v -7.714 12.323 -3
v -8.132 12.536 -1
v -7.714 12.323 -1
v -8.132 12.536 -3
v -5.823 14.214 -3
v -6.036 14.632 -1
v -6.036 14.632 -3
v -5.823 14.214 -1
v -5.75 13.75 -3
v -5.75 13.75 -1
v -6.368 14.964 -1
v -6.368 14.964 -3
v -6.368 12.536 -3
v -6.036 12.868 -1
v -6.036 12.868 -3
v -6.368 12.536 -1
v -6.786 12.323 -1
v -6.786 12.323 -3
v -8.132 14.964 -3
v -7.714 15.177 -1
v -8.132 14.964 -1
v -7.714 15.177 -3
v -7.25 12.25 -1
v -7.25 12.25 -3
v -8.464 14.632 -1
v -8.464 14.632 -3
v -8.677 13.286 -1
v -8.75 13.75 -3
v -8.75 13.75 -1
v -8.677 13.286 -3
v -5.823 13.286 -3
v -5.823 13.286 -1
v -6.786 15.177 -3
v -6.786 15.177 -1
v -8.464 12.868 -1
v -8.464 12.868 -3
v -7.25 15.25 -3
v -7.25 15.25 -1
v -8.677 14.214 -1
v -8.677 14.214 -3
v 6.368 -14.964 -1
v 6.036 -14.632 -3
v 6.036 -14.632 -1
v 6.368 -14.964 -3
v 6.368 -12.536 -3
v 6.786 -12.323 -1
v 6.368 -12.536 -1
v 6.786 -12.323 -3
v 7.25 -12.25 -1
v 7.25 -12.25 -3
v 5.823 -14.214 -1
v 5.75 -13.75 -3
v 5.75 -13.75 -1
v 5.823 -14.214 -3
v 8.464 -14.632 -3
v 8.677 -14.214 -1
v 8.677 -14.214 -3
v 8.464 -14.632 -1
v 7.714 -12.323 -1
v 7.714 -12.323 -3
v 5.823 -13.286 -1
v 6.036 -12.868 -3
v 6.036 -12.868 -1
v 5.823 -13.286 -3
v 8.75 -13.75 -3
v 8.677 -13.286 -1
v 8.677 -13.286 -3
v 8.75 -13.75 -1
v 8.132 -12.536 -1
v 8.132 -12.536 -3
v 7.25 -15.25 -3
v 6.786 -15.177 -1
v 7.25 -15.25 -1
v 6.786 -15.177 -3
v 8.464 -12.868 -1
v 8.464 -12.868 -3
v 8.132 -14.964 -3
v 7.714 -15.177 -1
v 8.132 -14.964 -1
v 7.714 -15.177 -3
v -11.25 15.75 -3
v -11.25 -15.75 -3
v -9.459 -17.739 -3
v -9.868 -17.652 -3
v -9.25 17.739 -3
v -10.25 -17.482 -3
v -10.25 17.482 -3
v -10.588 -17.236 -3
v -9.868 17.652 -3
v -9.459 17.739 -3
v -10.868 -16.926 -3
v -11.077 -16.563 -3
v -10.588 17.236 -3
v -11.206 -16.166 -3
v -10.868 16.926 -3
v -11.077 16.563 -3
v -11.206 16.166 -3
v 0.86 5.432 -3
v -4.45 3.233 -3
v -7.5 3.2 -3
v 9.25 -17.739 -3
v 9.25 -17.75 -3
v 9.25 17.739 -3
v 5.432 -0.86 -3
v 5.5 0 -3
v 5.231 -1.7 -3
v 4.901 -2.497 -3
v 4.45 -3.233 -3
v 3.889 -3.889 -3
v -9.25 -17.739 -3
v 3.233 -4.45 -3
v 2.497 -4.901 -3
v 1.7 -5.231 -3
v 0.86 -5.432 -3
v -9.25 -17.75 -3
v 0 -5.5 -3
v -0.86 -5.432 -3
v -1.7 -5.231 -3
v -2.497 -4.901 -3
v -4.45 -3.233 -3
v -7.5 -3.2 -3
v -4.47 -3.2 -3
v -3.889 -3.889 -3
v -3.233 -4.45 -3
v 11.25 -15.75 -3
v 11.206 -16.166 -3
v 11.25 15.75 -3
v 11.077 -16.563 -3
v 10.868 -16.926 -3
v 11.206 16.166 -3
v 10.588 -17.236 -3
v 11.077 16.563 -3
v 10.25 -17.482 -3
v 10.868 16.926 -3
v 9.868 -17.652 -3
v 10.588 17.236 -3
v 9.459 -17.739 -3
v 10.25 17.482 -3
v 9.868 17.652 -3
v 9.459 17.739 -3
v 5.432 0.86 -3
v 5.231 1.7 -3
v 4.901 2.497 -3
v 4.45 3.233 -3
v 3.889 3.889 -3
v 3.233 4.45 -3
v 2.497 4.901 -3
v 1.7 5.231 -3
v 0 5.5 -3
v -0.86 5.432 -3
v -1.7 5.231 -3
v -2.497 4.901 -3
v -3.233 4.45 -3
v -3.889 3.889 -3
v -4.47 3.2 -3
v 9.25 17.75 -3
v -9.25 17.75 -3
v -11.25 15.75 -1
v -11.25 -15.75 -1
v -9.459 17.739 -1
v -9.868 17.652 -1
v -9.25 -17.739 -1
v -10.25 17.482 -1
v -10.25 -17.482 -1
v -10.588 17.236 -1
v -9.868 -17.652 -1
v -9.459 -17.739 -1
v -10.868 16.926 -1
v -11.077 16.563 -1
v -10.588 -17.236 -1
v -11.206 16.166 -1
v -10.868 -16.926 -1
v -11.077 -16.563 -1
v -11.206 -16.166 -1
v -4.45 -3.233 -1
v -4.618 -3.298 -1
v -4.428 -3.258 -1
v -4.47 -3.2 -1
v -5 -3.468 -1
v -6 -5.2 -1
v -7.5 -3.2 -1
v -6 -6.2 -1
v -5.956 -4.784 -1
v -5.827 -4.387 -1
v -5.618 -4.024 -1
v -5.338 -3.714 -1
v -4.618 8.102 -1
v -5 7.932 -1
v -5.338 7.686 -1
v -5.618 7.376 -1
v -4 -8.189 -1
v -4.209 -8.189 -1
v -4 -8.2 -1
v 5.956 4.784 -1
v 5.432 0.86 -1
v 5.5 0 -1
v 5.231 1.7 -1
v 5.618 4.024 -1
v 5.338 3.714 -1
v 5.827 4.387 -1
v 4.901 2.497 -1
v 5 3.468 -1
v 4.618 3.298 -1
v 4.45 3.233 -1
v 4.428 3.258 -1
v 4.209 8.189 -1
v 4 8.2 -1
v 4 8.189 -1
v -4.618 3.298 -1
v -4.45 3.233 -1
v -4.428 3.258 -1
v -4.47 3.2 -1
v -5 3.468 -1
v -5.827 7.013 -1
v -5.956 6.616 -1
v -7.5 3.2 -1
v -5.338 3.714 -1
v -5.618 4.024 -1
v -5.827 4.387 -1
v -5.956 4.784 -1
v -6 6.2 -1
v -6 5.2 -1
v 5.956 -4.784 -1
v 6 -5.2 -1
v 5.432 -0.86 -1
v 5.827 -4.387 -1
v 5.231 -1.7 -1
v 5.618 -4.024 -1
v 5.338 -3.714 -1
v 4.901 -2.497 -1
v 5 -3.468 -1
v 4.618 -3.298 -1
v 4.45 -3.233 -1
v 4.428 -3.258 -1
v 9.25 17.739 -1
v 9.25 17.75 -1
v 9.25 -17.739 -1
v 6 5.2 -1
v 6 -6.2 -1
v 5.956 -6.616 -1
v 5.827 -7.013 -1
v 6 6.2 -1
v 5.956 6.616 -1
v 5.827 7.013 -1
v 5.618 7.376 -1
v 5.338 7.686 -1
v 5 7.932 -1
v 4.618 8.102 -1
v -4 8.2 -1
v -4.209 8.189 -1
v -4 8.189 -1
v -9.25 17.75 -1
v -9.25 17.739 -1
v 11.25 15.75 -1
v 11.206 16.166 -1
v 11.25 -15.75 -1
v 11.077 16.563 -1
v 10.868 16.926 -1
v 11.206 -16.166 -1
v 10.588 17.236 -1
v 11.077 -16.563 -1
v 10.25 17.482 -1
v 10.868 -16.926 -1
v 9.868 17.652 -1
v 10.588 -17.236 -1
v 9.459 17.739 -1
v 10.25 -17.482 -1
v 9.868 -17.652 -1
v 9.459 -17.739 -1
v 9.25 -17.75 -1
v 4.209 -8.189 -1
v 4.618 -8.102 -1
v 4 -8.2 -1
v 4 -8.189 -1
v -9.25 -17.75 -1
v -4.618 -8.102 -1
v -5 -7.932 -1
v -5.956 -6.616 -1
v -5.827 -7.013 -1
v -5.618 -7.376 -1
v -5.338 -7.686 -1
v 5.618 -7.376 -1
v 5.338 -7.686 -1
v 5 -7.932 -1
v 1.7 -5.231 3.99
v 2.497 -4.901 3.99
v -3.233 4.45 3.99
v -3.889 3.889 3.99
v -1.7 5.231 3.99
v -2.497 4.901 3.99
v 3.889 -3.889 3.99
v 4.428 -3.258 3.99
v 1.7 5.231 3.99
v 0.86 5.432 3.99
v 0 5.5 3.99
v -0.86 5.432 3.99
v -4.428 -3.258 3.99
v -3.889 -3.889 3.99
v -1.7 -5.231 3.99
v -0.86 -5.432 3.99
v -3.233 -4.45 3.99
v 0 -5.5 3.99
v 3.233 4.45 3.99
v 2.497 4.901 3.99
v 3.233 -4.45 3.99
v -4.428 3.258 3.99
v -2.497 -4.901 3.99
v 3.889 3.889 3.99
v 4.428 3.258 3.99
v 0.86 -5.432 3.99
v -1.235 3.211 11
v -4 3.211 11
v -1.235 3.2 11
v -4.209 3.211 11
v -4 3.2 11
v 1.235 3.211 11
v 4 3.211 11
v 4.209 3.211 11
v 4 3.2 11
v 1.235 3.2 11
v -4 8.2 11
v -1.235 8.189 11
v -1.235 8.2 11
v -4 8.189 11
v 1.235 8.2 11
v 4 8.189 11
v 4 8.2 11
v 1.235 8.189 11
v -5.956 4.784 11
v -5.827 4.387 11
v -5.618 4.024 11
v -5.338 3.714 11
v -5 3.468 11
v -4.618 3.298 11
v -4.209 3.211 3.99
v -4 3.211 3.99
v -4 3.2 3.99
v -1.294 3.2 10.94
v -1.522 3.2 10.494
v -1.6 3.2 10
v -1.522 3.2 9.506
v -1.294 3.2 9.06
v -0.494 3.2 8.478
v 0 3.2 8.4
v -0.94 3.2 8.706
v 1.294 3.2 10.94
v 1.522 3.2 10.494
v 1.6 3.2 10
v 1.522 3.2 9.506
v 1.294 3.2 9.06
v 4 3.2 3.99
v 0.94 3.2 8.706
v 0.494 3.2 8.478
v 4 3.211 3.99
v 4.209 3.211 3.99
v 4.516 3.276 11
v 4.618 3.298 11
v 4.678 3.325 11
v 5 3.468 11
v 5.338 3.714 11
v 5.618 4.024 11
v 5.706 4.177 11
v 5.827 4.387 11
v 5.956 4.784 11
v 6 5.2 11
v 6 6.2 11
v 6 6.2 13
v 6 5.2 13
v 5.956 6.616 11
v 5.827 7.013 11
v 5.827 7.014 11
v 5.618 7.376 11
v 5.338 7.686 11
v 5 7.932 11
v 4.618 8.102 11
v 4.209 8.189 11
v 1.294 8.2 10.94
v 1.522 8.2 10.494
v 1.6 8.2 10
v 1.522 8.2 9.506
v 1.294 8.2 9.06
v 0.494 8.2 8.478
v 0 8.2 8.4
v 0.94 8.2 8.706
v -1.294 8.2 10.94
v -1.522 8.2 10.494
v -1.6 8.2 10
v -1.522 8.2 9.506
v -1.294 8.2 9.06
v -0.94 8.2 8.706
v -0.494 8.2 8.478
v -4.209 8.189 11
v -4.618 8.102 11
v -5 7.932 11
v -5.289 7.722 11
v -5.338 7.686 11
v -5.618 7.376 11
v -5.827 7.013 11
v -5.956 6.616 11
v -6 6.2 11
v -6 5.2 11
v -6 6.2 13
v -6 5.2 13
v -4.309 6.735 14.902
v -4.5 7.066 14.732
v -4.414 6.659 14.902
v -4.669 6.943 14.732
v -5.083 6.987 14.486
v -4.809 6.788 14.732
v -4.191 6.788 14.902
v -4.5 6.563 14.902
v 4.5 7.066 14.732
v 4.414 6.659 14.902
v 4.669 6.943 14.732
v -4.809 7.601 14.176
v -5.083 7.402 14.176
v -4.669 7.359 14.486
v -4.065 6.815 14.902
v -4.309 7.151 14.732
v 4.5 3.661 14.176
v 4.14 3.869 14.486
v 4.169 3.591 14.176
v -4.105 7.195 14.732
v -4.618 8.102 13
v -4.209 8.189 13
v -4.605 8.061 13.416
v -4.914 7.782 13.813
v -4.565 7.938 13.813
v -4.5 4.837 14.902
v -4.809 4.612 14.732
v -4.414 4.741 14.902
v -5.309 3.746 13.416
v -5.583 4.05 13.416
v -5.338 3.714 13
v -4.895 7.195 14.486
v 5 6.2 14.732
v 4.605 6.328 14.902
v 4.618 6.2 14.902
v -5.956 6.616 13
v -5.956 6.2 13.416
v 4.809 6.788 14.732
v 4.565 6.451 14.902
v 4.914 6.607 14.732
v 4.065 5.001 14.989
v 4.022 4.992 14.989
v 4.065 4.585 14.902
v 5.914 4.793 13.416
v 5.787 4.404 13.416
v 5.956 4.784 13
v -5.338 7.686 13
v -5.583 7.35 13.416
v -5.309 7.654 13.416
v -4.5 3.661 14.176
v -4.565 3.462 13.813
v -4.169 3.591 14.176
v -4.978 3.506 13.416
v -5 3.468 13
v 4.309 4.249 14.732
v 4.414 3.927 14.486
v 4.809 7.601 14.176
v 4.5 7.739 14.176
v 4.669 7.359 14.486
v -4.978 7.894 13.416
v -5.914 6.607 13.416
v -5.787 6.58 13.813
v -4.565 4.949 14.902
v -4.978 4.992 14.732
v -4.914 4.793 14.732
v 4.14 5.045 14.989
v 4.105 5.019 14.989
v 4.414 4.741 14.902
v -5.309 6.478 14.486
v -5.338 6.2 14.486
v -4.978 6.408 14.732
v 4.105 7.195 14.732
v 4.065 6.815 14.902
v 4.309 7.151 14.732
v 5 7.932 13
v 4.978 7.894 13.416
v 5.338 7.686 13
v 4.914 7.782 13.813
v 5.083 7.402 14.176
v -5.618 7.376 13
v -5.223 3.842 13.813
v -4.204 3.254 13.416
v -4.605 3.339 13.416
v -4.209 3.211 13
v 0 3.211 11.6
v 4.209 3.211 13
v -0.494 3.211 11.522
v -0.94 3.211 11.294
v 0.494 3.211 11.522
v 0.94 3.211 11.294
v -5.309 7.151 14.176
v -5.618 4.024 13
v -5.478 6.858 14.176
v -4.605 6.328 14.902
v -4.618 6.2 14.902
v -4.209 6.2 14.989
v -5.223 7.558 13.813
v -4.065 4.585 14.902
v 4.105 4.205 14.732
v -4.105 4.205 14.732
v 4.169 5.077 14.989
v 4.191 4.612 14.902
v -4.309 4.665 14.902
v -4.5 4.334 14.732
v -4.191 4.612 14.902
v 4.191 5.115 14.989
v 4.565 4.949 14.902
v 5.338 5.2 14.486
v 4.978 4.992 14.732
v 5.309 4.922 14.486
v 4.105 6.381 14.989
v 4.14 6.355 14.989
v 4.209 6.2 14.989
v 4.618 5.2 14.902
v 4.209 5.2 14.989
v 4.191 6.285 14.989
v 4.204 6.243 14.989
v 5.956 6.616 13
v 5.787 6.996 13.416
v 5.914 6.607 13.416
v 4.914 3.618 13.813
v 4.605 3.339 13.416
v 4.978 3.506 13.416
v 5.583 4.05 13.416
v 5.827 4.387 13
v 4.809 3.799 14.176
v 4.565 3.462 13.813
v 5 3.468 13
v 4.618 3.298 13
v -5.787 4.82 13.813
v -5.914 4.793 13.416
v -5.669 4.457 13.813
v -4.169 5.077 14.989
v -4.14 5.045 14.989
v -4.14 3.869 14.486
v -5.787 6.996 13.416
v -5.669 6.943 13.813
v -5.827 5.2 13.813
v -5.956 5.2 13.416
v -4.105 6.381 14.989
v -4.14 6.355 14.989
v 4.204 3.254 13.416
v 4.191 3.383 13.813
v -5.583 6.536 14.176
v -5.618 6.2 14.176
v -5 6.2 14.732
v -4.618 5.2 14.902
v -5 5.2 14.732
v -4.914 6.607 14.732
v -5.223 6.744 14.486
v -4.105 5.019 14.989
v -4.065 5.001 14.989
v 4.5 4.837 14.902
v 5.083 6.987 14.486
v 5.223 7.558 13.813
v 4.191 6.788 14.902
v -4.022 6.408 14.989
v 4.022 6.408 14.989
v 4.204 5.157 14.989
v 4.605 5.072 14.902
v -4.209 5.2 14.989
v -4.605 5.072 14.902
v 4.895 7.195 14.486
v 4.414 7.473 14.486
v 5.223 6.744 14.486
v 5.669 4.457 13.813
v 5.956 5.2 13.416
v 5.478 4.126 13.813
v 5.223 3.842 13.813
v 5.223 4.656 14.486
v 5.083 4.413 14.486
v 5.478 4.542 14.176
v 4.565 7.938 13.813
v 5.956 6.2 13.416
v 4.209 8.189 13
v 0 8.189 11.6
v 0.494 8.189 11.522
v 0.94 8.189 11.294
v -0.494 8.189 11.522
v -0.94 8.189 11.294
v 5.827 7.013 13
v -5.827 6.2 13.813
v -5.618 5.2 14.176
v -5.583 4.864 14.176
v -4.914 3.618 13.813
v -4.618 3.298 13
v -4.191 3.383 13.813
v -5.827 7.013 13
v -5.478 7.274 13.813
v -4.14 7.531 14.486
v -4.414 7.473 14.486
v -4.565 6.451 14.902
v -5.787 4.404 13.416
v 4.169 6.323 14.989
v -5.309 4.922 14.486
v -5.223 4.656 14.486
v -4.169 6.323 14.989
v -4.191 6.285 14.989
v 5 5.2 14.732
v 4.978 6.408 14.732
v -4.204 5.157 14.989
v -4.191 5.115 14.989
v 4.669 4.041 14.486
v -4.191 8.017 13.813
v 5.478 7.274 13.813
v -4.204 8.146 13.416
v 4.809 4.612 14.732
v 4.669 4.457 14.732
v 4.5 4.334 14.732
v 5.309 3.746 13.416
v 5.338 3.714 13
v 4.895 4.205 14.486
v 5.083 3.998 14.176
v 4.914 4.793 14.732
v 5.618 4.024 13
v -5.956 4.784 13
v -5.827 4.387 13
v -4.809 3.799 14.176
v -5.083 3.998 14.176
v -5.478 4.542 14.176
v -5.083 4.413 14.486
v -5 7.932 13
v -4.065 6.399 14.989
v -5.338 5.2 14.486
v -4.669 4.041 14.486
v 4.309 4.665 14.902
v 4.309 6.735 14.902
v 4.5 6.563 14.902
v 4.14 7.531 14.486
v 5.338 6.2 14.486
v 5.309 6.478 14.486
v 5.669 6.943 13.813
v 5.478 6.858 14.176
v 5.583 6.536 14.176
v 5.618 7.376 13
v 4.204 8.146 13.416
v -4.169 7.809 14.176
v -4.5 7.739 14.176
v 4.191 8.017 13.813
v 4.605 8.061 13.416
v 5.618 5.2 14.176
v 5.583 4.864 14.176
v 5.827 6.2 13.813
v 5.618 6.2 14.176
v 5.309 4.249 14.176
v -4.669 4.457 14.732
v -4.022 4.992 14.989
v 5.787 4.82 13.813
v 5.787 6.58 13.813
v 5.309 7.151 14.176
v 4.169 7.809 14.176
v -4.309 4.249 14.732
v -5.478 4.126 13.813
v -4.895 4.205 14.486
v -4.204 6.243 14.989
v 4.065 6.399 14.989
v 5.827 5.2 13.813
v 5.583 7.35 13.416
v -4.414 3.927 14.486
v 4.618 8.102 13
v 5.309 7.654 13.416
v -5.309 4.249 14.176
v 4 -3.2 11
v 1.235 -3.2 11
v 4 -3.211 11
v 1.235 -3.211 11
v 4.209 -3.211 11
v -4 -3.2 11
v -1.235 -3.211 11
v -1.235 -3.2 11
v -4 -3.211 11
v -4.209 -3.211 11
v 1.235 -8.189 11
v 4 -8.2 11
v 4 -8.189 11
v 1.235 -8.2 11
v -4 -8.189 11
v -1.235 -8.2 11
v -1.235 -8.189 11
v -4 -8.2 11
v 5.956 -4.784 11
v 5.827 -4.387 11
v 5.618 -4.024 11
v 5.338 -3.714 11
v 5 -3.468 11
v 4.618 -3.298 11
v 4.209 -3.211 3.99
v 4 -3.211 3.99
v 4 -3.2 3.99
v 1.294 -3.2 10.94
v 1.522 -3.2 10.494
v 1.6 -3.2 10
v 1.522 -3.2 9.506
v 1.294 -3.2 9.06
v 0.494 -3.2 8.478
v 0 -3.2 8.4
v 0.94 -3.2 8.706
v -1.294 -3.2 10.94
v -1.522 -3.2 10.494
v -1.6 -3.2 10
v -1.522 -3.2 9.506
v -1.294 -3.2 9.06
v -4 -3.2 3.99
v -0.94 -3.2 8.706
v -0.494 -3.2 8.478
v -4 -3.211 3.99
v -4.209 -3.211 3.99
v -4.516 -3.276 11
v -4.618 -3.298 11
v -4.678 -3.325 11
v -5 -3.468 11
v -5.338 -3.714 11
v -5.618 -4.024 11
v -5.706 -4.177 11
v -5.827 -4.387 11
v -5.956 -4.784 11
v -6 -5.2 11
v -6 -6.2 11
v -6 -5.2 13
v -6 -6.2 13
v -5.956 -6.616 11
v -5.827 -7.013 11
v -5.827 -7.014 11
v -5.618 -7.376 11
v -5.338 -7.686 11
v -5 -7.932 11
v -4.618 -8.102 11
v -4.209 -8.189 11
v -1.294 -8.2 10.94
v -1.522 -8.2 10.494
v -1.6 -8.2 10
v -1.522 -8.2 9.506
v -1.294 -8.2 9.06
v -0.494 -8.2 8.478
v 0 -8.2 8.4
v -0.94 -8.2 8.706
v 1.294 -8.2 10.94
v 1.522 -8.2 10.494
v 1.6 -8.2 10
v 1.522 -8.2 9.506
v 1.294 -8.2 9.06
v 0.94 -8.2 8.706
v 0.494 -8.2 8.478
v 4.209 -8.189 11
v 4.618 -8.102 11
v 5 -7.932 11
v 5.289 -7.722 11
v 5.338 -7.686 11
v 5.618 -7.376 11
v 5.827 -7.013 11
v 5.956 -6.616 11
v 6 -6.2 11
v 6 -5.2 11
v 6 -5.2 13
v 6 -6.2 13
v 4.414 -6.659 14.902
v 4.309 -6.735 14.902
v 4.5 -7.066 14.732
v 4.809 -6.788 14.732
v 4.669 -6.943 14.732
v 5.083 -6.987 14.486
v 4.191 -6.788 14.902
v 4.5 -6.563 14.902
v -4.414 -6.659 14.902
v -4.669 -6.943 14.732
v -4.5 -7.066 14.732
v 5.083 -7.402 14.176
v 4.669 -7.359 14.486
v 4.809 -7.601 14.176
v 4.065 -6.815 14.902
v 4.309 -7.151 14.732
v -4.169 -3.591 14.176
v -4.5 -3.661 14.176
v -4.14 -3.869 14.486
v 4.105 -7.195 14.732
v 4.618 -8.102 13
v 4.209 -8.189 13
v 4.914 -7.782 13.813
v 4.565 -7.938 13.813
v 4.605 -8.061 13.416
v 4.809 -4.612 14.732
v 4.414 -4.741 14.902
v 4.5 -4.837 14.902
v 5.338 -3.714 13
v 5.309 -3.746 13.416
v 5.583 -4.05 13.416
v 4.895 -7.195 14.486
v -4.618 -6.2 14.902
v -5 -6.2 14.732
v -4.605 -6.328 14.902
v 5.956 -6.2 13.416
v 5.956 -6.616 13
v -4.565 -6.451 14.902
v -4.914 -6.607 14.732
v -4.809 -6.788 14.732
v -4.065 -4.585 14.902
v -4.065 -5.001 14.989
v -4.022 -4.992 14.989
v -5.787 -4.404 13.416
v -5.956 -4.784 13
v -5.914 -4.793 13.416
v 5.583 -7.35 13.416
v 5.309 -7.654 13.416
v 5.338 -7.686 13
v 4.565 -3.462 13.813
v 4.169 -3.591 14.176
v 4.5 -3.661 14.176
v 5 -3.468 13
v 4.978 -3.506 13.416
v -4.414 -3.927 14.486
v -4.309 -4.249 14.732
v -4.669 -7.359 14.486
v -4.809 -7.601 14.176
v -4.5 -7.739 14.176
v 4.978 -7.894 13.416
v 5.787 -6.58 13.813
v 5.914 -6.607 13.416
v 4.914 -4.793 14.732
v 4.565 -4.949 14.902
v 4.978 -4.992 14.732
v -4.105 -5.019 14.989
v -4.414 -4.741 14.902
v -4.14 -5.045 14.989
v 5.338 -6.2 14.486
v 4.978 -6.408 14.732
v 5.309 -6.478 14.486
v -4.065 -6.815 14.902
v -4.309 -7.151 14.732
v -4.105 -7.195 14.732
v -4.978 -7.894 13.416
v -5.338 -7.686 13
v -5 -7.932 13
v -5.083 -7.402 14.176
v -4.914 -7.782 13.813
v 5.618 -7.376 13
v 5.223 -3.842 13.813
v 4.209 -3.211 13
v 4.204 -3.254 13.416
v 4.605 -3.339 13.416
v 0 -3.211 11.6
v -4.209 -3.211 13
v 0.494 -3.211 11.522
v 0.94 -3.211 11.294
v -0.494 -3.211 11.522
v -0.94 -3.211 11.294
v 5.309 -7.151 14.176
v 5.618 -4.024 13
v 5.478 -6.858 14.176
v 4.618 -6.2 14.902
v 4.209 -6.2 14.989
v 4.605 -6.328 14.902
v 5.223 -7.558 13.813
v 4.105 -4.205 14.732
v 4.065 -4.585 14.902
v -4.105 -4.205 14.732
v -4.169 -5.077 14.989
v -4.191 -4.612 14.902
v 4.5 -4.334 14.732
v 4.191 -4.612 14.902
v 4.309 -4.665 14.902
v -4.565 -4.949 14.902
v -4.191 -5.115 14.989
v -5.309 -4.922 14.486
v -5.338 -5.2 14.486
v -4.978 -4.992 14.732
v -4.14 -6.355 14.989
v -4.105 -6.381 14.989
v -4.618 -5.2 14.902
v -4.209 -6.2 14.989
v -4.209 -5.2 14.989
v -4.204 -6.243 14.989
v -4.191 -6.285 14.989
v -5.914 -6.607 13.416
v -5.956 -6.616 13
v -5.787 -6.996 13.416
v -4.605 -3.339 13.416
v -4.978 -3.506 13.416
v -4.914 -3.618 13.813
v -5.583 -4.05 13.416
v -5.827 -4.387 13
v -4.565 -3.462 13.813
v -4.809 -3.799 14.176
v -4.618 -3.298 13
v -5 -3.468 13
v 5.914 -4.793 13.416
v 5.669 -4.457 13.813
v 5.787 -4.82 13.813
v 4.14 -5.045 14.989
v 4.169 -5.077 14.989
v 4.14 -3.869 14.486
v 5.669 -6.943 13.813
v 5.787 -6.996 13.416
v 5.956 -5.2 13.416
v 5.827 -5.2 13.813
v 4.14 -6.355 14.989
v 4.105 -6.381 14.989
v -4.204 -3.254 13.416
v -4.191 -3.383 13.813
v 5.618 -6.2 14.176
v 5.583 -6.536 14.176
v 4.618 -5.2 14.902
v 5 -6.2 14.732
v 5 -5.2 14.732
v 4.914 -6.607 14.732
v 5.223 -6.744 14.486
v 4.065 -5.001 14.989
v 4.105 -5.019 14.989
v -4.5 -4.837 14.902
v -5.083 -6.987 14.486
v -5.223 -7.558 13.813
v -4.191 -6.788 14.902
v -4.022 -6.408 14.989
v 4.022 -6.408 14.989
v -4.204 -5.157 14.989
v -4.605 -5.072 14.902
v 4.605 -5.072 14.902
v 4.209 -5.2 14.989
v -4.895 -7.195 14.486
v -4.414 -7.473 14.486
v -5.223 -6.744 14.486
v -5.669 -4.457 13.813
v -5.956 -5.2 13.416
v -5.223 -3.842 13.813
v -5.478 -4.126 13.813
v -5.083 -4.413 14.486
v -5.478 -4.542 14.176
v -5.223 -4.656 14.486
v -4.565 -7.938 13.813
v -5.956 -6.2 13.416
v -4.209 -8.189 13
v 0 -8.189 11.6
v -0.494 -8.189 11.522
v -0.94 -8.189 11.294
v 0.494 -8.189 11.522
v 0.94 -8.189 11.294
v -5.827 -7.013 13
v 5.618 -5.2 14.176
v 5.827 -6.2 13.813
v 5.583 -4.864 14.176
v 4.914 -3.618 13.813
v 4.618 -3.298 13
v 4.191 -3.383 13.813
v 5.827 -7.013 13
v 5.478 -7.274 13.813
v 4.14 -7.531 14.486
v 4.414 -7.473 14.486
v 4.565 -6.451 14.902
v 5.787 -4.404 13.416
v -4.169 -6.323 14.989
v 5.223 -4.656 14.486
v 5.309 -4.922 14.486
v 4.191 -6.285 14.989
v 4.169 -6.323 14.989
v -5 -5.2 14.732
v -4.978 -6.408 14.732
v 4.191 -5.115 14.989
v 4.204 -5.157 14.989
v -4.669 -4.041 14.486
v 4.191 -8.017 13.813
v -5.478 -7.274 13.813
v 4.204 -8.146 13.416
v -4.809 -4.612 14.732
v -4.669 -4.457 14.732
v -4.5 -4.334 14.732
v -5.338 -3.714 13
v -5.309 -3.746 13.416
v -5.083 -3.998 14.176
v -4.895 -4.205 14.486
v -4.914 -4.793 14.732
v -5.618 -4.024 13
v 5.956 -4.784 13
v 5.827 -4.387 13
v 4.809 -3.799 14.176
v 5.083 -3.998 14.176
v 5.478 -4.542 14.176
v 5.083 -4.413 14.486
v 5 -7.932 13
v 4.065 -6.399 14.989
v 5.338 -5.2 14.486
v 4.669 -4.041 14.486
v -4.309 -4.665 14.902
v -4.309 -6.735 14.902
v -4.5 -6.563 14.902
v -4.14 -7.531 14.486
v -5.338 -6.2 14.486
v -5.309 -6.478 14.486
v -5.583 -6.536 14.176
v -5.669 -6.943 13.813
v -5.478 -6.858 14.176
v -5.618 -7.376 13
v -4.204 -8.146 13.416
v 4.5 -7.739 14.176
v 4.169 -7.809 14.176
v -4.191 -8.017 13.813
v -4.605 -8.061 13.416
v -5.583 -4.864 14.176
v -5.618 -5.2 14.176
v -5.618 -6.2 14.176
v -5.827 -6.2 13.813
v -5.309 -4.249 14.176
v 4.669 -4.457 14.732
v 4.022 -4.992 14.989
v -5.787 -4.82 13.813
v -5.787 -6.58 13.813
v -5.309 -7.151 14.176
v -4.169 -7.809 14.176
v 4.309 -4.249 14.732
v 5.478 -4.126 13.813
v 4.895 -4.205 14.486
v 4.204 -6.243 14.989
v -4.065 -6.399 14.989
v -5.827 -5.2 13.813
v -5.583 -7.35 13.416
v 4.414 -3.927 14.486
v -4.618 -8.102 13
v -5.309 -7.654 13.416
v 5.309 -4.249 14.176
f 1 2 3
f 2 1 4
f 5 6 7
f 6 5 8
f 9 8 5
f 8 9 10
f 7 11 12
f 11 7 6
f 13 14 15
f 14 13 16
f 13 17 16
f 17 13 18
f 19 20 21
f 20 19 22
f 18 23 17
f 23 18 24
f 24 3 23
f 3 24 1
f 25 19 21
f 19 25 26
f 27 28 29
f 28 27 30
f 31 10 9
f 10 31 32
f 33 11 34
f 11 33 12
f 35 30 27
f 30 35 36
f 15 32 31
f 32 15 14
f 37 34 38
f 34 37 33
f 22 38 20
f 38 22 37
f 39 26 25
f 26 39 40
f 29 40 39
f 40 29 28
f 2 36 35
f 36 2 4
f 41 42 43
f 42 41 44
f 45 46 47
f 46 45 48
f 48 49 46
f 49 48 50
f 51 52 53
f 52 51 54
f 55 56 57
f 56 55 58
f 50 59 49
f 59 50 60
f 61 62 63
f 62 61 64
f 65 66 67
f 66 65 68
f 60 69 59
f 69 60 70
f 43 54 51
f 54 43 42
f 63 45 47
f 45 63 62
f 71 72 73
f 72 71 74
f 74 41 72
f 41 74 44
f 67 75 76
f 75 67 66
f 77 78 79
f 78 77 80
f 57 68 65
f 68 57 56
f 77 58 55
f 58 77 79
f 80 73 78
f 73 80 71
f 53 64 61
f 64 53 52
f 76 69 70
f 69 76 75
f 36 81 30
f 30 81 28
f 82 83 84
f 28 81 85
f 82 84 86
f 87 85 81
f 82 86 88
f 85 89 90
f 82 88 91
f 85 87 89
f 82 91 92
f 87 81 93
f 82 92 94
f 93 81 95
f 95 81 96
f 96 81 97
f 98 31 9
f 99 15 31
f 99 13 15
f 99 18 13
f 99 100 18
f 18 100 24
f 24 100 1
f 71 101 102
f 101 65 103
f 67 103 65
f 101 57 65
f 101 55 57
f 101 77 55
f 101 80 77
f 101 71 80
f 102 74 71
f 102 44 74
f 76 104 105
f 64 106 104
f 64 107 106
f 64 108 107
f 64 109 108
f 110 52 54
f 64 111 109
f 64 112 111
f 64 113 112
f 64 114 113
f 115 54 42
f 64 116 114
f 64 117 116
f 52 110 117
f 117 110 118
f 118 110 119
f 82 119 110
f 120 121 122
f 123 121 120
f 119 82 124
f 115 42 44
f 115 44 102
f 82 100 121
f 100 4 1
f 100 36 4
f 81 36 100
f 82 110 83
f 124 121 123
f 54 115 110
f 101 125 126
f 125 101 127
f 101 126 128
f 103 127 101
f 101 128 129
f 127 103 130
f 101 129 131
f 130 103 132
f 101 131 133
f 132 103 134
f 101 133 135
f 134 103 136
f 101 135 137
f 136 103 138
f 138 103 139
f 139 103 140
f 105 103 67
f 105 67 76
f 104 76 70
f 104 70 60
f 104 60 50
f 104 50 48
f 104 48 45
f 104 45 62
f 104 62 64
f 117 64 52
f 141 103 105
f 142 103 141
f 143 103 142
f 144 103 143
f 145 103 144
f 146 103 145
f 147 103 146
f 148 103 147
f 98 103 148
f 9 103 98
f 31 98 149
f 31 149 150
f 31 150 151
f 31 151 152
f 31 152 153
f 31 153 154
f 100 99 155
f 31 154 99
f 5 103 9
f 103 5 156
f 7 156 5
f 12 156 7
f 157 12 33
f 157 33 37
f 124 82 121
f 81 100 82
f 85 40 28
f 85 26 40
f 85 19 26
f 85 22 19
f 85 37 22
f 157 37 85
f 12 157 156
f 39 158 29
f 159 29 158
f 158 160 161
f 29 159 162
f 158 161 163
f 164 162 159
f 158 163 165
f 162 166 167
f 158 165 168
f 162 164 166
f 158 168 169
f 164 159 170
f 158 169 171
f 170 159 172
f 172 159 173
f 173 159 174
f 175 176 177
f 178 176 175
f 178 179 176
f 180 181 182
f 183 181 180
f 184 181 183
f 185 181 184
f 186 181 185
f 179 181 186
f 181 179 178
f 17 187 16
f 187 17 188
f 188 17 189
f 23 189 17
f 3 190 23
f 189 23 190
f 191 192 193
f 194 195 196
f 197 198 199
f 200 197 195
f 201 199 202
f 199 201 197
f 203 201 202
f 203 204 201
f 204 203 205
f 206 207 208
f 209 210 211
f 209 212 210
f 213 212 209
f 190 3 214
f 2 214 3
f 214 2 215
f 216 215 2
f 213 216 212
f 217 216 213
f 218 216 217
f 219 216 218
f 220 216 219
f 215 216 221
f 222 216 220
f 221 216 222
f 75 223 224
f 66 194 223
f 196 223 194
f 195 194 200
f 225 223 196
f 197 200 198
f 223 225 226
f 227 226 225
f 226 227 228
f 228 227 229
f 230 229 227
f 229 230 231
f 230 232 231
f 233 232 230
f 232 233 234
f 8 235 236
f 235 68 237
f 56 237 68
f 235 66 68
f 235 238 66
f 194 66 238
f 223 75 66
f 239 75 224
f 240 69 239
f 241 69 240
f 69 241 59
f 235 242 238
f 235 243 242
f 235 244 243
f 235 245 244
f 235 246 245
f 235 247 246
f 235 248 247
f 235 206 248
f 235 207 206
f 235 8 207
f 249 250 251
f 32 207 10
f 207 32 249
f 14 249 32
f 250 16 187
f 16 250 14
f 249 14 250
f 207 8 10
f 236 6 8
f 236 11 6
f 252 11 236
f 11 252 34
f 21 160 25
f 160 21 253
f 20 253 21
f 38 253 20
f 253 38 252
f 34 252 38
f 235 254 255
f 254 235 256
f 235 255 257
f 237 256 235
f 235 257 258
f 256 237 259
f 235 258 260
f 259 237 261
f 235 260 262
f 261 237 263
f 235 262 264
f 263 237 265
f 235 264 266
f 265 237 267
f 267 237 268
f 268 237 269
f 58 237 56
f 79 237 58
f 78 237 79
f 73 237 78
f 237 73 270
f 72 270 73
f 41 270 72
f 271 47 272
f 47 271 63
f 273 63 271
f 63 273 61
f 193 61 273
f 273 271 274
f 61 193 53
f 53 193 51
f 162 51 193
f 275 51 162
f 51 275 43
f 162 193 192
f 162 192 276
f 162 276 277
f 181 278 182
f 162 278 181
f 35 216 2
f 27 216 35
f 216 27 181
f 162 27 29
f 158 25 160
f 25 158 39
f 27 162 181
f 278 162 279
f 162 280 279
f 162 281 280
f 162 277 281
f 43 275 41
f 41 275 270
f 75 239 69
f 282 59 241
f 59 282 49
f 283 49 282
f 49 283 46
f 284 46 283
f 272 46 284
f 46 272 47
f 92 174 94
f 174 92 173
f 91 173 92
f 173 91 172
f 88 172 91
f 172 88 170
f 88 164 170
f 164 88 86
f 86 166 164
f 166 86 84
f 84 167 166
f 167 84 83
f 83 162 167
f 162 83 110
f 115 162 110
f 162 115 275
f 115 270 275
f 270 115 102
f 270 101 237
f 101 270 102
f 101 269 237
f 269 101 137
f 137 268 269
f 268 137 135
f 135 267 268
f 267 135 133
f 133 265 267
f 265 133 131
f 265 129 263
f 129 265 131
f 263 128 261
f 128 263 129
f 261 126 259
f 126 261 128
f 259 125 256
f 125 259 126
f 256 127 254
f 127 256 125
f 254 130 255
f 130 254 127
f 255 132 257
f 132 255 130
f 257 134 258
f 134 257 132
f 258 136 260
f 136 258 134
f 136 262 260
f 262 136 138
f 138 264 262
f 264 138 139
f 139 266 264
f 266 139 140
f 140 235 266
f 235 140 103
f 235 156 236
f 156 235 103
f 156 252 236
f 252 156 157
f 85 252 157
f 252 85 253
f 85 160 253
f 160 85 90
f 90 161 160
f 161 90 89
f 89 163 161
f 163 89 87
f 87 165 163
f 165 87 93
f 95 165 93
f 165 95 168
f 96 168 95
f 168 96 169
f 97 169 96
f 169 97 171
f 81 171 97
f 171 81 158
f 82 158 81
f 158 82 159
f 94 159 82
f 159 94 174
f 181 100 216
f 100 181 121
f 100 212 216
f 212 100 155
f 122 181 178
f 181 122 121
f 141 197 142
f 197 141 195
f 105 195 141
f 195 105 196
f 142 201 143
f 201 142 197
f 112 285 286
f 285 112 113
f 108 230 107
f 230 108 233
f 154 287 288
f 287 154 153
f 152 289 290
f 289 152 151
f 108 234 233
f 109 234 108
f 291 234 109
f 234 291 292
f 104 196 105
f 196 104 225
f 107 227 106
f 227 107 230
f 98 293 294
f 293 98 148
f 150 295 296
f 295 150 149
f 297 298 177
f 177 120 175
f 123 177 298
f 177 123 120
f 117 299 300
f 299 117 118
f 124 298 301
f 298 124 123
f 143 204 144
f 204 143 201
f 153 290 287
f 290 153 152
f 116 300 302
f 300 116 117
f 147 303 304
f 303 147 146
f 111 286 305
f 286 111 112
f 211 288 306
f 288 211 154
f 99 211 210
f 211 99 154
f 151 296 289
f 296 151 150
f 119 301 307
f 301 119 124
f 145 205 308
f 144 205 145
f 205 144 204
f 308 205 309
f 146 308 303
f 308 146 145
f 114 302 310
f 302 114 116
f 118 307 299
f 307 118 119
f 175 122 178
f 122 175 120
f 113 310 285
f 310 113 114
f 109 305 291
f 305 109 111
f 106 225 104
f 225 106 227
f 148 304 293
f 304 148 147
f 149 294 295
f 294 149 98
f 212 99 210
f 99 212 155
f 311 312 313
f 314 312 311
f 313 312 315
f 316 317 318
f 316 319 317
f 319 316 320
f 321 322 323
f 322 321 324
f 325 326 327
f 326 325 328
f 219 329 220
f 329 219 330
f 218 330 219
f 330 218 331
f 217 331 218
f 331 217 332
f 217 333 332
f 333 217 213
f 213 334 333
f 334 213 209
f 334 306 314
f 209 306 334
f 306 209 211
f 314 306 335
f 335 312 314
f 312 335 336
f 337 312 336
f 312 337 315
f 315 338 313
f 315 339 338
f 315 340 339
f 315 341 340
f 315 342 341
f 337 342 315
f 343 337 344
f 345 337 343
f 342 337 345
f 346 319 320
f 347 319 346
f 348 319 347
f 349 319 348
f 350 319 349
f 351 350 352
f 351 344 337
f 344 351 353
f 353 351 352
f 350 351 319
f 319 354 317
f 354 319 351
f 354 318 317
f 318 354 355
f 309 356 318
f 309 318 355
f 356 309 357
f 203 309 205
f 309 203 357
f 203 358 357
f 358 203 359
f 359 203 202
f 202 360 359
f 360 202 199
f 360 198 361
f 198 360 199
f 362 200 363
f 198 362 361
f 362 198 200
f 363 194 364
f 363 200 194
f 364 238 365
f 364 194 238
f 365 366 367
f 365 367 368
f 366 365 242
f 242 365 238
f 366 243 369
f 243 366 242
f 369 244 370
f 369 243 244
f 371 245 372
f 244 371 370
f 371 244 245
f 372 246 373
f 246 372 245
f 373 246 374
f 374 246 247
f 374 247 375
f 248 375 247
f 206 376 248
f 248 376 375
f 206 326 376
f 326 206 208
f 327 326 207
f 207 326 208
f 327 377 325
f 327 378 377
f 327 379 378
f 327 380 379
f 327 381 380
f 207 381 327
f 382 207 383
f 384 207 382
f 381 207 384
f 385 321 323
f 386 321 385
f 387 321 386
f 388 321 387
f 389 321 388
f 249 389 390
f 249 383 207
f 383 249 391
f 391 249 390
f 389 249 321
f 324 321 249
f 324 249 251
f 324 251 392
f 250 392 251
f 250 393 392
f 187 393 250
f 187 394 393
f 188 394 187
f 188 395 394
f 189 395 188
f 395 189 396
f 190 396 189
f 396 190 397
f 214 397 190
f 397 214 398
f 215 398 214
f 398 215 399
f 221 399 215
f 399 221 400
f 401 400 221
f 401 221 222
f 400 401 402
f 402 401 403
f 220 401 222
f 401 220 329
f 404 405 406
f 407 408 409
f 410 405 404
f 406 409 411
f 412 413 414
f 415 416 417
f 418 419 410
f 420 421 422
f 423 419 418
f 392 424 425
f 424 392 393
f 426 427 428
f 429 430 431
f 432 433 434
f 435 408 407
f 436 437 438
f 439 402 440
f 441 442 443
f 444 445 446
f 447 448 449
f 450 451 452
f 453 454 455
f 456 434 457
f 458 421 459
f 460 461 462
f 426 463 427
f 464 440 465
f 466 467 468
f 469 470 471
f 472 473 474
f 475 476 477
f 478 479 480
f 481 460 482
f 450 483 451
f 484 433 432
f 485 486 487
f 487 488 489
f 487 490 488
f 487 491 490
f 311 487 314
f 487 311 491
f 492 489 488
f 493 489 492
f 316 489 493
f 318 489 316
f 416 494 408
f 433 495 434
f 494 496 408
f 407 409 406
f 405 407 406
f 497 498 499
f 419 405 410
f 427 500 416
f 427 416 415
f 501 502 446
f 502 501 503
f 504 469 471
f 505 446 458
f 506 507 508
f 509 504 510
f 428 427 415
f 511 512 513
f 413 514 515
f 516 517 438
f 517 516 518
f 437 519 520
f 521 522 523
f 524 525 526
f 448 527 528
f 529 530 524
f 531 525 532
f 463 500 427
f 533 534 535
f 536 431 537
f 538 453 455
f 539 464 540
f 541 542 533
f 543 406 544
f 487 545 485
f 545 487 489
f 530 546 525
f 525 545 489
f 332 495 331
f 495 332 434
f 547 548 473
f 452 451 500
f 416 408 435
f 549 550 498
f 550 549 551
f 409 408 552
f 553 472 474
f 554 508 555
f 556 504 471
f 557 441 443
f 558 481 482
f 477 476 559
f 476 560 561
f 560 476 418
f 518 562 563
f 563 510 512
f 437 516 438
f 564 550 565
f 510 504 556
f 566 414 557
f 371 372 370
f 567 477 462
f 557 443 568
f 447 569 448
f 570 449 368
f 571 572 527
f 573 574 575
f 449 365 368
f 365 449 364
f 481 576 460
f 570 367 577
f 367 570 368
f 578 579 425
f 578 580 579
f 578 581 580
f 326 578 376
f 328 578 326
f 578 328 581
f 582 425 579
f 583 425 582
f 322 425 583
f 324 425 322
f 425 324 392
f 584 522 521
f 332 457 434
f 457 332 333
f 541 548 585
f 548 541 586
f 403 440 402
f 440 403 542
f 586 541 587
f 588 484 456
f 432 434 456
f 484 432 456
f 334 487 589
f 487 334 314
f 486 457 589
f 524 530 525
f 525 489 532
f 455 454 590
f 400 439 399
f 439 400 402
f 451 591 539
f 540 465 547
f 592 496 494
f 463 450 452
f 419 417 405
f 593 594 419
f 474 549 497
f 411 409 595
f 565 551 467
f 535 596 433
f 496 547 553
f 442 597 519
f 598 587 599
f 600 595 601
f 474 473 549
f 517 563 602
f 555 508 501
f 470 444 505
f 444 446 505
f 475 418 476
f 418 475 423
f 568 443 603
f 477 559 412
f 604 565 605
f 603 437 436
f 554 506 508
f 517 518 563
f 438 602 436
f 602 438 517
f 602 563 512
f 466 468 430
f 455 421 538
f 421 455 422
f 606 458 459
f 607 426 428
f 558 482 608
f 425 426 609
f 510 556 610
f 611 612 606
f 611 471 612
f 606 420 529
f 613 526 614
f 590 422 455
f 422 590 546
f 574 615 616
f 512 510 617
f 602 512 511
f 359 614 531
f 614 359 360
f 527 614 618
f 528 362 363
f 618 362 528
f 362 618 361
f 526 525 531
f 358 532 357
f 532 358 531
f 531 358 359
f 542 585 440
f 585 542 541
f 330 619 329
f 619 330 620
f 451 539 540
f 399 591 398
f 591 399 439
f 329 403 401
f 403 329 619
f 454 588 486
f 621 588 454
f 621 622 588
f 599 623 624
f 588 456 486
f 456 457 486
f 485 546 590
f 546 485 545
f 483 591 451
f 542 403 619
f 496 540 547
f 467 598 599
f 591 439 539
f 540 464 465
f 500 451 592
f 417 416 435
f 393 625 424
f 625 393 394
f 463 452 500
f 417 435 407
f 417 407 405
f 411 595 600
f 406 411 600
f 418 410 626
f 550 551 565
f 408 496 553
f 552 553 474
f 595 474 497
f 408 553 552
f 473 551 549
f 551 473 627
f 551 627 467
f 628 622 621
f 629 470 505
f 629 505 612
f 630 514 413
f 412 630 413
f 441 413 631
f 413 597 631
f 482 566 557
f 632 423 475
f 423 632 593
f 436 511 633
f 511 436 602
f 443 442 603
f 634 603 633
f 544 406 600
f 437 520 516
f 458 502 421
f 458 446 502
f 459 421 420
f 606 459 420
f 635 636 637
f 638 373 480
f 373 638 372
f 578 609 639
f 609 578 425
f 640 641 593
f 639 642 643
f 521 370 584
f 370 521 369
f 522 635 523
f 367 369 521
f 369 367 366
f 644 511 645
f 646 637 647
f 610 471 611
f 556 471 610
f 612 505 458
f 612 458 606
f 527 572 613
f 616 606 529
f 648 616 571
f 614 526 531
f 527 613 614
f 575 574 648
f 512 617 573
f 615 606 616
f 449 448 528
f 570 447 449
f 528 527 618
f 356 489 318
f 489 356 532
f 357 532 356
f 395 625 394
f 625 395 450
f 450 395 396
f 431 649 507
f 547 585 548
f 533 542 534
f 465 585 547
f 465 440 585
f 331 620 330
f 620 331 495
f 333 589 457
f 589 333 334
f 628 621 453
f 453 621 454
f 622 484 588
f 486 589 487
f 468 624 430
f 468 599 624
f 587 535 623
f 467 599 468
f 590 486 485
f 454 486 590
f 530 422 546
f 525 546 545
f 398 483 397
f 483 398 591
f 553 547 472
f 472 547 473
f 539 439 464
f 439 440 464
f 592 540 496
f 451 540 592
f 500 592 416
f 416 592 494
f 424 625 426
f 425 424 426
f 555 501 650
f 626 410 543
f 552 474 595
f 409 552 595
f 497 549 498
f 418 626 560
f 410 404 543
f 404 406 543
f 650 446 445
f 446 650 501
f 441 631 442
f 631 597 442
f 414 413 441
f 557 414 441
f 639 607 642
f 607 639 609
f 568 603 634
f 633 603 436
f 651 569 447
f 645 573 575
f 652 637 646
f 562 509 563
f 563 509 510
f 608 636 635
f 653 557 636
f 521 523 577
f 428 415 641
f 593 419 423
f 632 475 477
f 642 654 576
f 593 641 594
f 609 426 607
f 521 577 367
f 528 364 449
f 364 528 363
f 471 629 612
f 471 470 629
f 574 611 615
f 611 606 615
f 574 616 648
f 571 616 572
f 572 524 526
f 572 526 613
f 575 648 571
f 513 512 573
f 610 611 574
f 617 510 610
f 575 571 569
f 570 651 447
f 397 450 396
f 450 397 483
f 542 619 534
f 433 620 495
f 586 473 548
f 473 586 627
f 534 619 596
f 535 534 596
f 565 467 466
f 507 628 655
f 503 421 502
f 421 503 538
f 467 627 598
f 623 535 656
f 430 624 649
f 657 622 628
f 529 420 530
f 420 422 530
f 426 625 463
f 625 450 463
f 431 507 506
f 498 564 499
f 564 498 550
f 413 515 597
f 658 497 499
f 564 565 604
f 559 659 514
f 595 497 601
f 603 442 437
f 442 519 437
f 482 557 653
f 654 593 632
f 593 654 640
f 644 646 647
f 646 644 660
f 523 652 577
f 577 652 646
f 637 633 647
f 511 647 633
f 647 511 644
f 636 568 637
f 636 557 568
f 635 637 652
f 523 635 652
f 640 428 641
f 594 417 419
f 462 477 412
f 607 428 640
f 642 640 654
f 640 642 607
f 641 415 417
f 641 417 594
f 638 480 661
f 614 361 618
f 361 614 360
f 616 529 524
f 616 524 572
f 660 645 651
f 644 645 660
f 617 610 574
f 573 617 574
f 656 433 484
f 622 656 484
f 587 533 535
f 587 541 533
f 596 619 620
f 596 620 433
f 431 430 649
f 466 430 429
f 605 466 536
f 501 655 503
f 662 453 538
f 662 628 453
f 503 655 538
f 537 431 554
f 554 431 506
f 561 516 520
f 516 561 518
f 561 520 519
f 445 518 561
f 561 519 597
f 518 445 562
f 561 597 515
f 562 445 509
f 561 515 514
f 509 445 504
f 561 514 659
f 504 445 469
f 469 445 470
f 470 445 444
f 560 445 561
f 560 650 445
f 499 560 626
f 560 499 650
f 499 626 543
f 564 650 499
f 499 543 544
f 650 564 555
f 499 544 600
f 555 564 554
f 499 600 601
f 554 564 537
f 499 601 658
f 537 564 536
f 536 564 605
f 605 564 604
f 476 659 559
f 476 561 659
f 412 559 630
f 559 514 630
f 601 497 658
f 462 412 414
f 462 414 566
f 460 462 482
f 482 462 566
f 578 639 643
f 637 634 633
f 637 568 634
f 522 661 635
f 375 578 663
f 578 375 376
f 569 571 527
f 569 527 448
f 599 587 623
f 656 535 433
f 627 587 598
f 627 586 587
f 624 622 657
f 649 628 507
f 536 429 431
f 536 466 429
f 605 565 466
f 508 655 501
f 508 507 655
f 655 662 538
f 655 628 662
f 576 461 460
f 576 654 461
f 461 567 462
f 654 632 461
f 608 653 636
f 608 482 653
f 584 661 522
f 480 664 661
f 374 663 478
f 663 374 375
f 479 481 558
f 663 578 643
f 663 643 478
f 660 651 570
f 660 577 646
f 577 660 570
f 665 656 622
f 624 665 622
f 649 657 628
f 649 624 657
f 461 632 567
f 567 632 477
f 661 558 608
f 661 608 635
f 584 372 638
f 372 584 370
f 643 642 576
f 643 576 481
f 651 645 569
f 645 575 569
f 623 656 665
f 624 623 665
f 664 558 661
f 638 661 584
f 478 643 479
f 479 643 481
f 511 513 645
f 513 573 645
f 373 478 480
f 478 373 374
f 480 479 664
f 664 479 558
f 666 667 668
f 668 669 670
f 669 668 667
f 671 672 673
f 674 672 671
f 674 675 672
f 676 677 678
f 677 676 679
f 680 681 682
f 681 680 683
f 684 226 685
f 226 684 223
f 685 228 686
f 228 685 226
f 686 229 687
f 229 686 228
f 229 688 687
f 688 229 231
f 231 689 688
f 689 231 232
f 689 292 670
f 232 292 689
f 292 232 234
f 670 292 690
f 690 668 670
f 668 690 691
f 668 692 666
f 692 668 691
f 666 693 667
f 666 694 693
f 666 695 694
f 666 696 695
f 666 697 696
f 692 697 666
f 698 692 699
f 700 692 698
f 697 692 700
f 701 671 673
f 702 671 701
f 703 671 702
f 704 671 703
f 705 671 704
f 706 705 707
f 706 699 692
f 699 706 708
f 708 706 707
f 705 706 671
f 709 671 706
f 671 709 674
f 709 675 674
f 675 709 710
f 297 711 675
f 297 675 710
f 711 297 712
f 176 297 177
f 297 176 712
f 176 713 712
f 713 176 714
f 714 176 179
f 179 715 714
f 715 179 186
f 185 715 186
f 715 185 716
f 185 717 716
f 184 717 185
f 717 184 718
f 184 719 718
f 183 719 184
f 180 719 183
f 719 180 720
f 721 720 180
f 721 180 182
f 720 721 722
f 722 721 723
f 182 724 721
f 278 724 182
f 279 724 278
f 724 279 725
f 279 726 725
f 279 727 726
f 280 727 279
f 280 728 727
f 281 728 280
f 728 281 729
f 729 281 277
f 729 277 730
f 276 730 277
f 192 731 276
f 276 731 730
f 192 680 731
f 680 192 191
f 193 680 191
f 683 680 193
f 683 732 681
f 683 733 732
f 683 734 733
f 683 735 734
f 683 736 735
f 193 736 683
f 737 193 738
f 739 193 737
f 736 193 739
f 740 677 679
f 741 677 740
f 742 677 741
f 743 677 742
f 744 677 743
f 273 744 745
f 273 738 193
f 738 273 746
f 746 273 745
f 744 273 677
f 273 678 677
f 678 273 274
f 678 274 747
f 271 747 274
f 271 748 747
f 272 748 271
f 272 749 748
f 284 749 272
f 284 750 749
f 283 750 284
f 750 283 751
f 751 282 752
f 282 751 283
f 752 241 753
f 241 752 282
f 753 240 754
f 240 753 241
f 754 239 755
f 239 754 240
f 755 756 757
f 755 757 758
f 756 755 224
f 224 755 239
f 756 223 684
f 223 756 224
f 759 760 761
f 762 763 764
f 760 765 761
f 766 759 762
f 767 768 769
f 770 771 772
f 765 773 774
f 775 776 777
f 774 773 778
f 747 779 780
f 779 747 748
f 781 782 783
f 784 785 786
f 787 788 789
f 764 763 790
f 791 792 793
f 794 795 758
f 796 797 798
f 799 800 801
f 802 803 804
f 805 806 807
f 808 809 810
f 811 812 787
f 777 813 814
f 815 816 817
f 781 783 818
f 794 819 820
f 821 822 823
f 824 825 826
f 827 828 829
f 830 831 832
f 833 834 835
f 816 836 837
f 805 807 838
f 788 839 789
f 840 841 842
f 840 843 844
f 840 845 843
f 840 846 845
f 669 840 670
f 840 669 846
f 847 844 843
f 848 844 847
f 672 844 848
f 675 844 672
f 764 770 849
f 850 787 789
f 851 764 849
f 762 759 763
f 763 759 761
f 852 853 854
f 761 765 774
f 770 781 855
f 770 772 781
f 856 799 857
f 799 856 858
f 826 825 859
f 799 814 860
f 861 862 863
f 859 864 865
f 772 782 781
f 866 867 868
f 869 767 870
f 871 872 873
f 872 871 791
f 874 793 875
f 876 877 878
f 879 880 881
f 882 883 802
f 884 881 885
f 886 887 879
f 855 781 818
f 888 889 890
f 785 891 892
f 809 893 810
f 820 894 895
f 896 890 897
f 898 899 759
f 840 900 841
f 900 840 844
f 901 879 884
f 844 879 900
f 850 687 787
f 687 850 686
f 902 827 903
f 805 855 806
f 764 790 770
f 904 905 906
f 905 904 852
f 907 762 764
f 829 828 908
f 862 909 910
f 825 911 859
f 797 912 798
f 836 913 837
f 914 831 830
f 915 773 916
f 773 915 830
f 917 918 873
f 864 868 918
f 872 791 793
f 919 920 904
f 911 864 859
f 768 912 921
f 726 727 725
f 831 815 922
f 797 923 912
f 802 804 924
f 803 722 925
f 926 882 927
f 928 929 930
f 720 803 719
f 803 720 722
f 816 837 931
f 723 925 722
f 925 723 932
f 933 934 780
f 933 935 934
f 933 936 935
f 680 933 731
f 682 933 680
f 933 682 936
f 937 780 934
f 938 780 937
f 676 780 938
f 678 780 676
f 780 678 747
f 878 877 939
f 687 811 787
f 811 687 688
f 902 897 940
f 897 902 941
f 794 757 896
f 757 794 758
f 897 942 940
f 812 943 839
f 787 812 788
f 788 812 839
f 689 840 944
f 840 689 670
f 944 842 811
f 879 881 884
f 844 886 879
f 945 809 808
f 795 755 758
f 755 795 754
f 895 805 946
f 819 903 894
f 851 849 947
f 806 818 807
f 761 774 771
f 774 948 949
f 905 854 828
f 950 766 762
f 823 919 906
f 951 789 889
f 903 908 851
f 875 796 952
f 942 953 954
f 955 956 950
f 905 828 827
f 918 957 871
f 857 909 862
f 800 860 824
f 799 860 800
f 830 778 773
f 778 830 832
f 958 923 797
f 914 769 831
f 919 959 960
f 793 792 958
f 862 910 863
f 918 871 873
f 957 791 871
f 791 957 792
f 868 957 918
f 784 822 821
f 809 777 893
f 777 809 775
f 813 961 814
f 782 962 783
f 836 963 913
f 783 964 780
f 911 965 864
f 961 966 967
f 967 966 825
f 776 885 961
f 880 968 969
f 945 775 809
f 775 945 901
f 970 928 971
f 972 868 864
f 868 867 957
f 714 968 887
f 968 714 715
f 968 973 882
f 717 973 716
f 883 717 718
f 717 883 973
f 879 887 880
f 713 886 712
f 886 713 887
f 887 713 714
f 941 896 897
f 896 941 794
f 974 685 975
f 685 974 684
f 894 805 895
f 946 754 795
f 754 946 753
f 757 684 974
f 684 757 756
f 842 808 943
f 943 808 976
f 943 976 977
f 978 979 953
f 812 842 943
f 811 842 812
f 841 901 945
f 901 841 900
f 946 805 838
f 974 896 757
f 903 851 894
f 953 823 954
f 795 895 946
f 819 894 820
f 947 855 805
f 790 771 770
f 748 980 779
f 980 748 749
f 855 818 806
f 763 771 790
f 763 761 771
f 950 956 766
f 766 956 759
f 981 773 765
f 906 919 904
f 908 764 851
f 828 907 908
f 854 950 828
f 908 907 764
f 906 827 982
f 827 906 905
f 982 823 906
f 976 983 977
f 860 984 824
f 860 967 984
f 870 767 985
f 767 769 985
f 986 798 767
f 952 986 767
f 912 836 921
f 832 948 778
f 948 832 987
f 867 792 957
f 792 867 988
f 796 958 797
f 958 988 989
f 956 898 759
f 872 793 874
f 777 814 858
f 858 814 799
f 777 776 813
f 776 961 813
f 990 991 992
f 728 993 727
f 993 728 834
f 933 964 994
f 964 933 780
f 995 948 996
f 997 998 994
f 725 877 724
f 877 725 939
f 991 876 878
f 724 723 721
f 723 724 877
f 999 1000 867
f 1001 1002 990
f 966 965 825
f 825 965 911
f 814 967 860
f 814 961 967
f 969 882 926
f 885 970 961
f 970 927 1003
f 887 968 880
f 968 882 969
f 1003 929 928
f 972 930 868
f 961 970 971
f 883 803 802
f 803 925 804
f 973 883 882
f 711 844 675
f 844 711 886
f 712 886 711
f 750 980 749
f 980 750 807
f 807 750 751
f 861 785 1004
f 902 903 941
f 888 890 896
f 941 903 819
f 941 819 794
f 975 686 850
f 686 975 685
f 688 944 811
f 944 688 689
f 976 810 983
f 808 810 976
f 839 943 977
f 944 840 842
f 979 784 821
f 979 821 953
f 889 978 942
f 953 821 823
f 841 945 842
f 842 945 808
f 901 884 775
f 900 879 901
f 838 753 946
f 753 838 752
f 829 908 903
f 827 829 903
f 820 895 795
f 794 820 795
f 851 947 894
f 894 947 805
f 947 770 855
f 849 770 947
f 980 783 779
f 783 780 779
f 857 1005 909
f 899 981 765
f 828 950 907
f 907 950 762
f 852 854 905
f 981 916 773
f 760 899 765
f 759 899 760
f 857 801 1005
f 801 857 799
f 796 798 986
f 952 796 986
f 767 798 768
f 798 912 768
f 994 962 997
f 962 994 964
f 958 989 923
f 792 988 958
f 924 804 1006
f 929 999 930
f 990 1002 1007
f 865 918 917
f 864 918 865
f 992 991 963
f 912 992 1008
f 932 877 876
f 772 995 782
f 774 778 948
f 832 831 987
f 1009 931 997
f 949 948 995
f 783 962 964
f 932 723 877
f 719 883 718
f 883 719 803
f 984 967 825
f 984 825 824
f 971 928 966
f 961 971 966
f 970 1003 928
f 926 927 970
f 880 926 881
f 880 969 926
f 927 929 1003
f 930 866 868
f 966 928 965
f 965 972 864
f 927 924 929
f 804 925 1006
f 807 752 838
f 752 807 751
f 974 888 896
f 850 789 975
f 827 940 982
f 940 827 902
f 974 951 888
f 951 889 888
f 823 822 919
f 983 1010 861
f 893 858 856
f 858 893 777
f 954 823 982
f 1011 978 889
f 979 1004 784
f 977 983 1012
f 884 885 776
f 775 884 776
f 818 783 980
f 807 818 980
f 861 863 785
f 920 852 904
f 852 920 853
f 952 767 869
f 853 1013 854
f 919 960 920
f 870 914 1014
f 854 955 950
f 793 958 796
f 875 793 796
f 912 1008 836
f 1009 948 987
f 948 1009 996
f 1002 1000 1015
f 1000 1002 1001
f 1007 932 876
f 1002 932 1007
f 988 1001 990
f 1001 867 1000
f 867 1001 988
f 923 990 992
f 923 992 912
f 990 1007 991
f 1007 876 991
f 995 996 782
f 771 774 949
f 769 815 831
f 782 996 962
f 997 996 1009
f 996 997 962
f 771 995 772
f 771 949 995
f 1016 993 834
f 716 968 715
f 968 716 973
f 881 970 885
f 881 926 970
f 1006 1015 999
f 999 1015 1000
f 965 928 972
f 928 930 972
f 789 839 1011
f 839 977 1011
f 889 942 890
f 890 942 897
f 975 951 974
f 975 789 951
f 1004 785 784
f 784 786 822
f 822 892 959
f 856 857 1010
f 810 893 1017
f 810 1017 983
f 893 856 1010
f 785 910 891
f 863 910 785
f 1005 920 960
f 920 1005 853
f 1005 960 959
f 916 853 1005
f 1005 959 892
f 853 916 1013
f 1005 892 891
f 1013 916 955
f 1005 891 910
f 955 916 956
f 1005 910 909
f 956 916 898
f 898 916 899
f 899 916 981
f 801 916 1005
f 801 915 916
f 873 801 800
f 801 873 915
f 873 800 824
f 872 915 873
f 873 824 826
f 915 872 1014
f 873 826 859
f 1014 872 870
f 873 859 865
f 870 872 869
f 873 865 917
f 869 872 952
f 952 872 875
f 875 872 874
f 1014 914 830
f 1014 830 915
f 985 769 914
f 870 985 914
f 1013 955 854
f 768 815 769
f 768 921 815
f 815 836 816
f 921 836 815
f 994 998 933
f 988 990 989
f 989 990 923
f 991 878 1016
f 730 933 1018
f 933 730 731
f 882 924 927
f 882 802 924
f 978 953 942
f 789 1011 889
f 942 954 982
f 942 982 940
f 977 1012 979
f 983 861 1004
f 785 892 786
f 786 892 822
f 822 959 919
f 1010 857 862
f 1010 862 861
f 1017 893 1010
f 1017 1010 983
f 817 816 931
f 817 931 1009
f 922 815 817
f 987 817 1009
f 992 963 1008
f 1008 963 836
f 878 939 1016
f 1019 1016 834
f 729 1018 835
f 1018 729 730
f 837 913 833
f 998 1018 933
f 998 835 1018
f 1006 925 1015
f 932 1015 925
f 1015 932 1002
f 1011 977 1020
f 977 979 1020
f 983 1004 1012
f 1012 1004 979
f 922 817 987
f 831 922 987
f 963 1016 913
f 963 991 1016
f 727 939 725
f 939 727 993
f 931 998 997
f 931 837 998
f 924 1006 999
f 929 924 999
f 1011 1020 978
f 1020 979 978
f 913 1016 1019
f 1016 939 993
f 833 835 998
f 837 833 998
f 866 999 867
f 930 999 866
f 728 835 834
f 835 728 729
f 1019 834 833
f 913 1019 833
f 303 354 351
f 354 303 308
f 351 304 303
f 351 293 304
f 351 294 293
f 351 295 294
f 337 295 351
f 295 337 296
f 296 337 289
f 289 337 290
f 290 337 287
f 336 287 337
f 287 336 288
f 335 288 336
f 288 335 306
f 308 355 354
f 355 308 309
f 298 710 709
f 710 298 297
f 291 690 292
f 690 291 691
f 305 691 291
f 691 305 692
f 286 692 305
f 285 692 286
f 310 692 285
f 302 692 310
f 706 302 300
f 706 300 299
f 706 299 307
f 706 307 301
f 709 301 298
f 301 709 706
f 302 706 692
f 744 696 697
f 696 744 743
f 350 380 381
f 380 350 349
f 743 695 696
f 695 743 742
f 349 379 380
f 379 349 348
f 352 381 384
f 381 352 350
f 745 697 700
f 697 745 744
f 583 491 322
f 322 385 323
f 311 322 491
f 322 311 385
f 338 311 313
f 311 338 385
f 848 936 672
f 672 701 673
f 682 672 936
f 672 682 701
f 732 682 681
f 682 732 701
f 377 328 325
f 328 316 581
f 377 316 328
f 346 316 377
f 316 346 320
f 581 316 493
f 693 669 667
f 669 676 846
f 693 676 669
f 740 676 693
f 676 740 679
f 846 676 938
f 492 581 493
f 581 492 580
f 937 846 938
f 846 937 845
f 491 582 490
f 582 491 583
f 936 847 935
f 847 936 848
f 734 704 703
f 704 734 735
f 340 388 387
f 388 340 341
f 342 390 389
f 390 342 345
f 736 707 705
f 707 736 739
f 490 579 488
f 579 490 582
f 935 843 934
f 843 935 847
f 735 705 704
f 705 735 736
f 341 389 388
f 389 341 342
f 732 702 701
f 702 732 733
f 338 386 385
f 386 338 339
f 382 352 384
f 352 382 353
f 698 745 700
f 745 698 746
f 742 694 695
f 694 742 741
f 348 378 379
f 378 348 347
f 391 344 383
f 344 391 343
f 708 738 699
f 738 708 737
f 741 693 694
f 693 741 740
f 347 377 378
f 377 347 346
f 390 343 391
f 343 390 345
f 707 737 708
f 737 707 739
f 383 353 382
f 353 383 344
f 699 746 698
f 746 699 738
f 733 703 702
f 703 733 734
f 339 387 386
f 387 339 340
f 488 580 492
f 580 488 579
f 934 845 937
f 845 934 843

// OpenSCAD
/**/
base();
//flicker(82);
/*/
translate([0,-20,0]) rotate([90,0]) flicker();
%translate([0,0,-1.5-5.5]) cylinder(d=10,h=6,$fn=60);
/**/
module flicker(angle=0) {
  translate([0,0,10]) rotate([90,0]) rotate([0,0,180+angle]) translate([0,0,-3]) difference() {
  union() {
    scale([2,1,1]) cylinder(d=12,h=6,$fn=50);
    translate([0,-6]) cube([11.5,6,6]);
    translate([-12,0]) cube([11,6,6]);
    rotate([0,0,270-45]) translate([0,-3]) linear_extrude(6) offset(1,$fn=20) polygon([[0,0],[20,2],[20,4],[0,6]]);
  }
  translate([0,0,-.01]) cylinder(d=3,h=6.02,$fn=20);
  translate([-5,6,-.01]) cube([10,5,6.02]);
  translate([11.5,-5,-.01]) cube([20,10,6.02]);
  
}
}
module base() {
difference() {
  translate([-11.25,-17.75,-3]) rcube([22.5,35.5,2],2);
  translate([-7.5,-3.2,-3.01]) cube([4,6.4,2.02]);
  for(m=[0,1]) rotate([0,0,180*m])
  translate([-11.25+4,17.75-4,-3.01]) cylinder(d=3,h=10,$fn=20);
  translate([0,0,-3.01]) cylinder(d=11,h=10,$fn=40);
}
difference() {
  for(r=[0,180]) rotate([0,0,r])
    translate([-6,3.2,-1]) {
      rcube([12,5,12],2);
      translate([0,0,10]) cube2([12,5,6],2);
    }
  translate([0,0,-1.01]) cylinder(d=11,h=5,$fn=40);
  translate([0,-10,10]) rotate([-90,0]) cylinder(d=3.2,h=20,$fn=20);
}
}


module rcube(dims,r=5,$fn=30)
{
  linear_extrude(dims[2],convexity=3) {
    for(x=[r,dims[0]-r],y=[r,dims[1]-r])
      translate([x,y]) circle(r=r,$fn=$fn);
    translate([0,r]) square([dims[0],dims[1]-r*2]);
    translate([r,0]) square([dims[0]-r*2,dims[1]]);
  }
}
module cube2(dims,r=5,$fn=30)
{
  minkowski() {
    translate([r,r,r]) cube([dims[0]-r*2,dims[1]-r*2,dims[2]-r*2]);
    sphere(r=r,$fn=$fn);
  }
  *union() {
    translate([0,0,r]) rcube([dims[0],dims[1],dims[2]-r*2],r,$fn);
    mirrorz(dims[2]) translate([0,0,r])
    {
      for(x=[r,dims[0]-r],y=[r,dims[1]-r])
        translate([x,y]) sphere(r=r,$fn=$fn);
      *mirrory(dims[1]) translate([r,r]) rotate([0,90]) cylinder(h=dims[1]-r*2,r=r,$fn=$fn);
    }
  }
}
